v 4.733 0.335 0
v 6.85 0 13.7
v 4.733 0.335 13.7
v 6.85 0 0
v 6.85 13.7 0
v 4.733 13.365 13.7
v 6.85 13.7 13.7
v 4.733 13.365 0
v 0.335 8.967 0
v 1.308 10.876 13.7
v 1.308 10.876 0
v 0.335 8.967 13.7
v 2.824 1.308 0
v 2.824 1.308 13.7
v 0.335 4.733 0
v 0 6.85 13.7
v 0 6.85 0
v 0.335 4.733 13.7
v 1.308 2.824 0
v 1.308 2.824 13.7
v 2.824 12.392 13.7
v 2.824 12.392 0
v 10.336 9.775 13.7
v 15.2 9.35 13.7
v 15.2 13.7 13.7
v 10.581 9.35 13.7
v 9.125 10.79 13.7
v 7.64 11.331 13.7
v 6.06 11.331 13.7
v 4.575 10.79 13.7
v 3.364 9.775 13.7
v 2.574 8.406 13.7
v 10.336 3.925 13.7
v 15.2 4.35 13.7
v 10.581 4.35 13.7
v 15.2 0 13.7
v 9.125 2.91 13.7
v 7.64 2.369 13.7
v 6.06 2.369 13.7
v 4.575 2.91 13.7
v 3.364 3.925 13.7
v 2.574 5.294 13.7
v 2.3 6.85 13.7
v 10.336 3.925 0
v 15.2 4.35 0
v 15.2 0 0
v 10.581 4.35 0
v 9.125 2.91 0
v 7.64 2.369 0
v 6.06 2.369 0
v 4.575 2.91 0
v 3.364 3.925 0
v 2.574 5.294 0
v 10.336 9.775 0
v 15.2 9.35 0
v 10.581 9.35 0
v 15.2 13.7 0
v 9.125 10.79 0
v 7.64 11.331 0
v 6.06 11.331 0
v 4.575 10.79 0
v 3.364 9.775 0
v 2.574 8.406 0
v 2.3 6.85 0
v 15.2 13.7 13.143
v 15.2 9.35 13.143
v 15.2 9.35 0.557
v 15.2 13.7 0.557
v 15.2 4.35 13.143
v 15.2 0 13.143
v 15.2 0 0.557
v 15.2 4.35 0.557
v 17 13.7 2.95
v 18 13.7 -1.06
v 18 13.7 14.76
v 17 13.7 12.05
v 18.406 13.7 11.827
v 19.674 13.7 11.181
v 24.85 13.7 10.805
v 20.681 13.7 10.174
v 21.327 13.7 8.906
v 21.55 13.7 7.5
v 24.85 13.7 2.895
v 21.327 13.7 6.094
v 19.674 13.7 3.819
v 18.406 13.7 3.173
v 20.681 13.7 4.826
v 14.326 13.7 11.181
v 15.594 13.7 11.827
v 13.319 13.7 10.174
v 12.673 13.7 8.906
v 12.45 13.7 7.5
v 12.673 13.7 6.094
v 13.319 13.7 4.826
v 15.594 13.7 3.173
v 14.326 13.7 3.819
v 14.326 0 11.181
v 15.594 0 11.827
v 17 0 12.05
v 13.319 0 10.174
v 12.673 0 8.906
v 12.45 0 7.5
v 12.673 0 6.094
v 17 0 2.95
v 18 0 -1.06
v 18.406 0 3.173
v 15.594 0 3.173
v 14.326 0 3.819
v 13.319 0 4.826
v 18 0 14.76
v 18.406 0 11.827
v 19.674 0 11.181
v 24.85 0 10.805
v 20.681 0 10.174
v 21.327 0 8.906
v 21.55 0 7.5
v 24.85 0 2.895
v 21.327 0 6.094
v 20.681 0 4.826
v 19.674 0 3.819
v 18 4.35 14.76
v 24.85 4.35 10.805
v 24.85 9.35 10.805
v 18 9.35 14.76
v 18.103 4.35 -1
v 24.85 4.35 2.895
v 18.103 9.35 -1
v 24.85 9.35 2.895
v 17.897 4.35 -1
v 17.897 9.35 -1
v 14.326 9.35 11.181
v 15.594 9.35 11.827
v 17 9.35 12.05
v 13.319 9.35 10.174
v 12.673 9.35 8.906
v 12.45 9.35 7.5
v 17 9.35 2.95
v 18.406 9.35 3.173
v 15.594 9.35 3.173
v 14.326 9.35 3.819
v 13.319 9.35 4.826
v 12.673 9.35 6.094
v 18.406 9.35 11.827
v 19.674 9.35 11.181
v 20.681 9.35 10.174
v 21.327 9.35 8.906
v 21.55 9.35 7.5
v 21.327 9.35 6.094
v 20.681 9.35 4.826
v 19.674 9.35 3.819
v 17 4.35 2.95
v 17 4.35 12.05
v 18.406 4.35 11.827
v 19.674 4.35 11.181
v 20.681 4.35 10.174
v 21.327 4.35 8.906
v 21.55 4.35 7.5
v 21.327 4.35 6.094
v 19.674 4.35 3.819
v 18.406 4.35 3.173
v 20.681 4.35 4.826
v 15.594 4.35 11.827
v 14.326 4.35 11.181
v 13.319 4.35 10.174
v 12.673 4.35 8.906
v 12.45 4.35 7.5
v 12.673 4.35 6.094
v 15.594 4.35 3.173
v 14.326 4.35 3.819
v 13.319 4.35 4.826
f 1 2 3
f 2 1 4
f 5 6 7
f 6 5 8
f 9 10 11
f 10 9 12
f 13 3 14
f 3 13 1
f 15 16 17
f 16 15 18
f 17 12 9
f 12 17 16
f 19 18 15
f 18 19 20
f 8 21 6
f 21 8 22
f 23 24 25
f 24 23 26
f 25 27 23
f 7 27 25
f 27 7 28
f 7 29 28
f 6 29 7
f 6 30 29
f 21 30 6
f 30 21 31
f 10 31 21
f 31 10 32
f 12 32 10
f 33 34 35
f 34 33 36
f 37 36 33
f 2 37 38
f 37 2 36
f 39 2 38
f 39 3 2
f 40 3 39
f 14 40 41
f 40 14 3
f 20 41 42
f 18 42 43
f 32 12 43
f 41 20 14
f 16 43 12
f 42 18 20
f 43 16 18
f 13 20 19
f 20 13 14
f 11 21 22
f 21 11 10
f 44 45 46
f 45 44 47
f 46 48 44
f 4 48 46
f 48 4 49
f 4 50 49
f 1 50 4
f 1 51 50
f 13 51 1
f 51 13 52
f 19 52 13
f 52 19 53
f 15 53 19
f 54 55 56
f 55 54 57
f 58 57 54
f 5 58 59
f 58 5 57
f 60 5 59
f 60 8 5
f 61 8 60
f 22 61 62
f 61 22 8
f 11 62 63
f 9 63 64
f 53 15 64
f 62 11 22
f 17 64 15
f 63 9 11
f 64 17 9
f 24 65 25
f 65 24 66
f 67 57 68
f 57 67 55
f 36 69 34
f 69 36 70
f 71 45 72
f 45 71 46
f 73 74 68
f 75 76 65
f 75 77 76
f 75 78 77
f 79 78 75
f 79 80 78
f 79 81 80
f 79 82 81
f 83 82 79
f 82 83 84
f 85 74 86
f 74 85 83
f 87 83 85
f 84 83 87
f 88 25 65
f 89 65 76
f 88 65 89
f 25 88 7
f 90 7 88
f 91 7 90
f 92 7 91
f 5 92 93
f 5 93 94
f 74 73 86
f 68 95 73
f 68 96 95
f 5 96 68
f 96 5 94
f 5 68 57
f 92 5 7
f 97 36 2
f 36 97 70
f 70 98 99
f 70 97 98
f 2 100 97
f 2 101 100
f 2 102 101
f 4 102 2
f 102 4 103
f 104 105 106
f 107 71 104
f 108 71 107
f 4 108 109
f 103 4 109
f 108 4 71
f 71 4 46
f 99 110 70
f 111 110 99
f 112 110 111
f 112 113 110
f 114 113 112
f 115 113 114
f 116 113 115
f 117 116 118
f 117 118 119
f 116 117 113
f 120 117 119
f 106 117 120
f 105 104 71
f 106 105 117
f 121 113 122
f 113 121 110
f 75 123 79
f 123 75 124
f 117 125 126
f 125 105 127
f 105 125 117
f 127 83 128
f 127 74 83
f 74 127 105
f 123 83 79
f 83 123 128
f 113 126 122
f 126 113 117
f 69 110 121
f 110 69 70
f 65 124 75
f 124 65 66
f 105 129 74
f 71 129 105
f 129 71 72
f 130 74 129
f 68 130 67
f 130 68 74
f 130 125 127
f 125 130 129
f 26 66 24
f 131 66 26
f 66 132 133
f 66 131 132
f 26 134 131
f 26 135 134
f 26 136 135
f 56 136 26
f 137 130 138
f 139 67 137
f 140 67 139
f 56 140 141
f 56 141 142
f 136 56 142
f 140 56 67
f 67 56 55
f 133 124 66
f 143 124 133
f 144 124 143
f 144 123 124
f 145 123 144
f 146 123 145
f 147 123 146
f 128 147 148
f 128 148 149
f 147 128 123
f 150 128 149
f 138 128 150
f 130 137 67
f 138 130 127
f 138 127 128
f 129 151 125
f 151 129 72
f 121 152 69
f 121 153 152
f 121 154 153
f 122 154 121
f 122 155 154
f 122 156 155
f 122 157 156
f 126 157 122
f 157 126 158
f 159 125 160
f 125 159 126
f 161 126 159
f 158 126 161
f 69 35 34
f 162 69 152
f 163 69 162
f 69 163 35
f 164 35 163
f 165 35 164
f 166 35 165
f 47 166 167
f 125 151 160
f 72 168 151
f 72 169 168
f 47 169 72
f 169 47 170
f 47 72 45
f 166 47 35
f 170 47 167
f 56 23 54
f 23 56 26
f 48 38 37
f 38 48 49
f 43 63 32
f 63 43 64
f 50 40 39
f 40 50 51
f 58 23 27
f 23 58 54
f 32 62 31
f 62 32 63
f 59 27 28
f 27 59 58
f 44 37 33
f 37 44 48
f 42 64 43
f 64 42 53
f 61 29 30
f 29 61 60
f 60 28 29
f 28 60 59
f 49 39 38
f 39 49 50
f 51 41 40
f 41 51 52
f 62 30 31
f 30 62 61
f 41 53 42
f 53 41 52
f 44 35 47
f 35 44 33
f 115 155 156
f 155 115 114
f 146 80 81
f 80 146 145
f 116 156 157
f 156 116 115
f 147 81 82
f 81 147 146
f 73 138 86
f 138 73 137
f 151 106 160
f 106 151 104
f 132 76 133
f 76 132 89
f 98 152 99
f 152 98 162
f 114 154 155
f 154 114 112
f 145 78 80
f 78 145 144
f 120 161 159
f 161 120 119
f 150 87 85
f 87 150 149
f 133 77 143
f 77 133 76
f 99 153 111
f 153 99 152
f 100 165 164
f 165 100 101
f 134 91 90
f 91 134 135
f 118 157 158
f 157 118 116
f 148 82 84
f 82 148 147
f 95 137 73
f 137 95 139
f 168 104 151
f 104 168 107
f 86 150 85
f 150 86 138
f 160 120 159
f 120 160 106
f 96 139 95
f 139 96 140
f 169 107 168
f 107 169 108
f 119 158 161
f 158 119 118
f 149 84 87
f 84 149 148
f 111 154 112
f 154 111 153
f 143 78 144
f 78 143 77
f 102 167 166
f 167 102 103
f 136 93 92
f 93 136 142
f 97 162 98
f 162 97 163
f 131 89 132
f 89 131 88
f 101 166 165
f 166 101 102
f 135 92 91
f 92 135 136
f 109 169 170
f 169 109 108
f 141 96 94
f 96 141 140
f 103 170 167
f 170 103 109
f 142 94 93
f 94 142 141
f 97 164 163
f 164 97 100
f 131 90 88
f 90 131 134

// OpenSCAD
// file: functions.scad
// PRUSA Mendel  
// Functions used in many files
// GNU GPL v3
// Josef Průša
// josefprusa@me.com
// prusadjs.cz
// http://www.reprap.org/wiki/Prusa_Mendel
// http://github.com/prusajr/PrusaMendel


module nut(d,h,horizontal=true){
cornerdiameter =  (d / 2) / cos (180 / 6);
cylinder(h = h, r = cornerdiameter, $fn = 6);
if(horizontal){
for(i = [1:6]){
	rotate([0,0,60*i]) translate([-cornerdiameter-0.2,0,0]) rotate([0,0,-45]) cube(size = [2,2,h]);
}}
}

// Based on nophead research
module polyhole(d,h) {
    n = max(round(2 * d),3);
    rotate([0,0,180])
        cylinder(h = h, r = (d / 2) / cos (180 / n), $fn = n);
}




module roundcorner(diameter){
	difference(){
		cube(size = [diameter,diameter,99], center = false);
		translate(v = [diameter, diameter, 0]) cylinder(h = 100, r=diameter, center=true);
	}
}
// file: metric.scad
// PRUSA Mendel  
// Default metric sizes
// GNU GPL v3
// Josef Průša
// josefprusa@me.com
// prusadjs.cz
// http://www.reprap.org/wiki/Prusa_Mendel
// http://github.com/prusajr/PrusaMendel

// DONT CHANGE THIS FILE! ALTER VALUES IN CONFIGURATION.SCAD INSTEAD

// RODS

threaded_rod_diameter = 8.7;
threaded_rod_diameter_horizontal = 8.7;
smooth_bar_diameter = 8;
smooth_bar_diameter_horizontal = 8.5;

// Nuts and bolts

m8_diameter = 9;
m8_nut_diameter = 14.1;

m4_diameter = 4.5;
m4_nut_diameter = 9;

m3_diameter = 3.6;
m3_nut_diameter = 5.3;
m3_nut_diameter_horizontal = 6.1;

// Bushing holder

bushing_core_diameter = smooth_bar_diameter;
bushing_material_thickness = 1;

// Motors

motor_shaft = 5.5;
// file: configuration.scad
// PRUSA Mendel  
// Configuration file
// GNU GPL v3
// Josef Průša
// josefprusa@me.com
// prusadjs.cz
// http://www.reprap.org/wiki/Prusa_Mendel
// http://github.com/prusajr/PrusaMendel

// PLEASE SELECT ONE OF THE CONFIGURATIONS BELOW
// BY UN-COMMENTING IT

// Uncomment for metric settings
// METRIC METRIC METRIC METRIC METRIC METRIC METRIC METRIC 

include <metric.scad>;

// CUSTOM CUSTOM CUSTOM CUSTOM CUSTOM CUSTOM CUSTOM CUSTOM CUSTOM

thin_wall = 3;


// Linear bearing version
linear = true;
// set false for LM-8UU, true for LM-E-8UU (ignore if linear is set to false)
lme8uu = false;



// CHANGE ONLY THE STUFF YOU KNOW
// IT WILL REPLACE DEFAULT SETTING

// RODS
threaded_rod_diameter = 9.1;
threaded_rod_diameter_horizontal = 0;
// smooth_bar_diameter = 0;
// smooth_bar_diameter_horizontal = 0;

// Nuts and bolts

m8_diameter = 8.125;
m8_nut_diameter = 13;

m4_diameter = 4.5;
m4_nut_diameter = 8.1;

m3_diameter = 3.45;
m3_nut_diameter = 6.34;

motor_shaft = 5.65;

// Bushing holder

// bushing_core_diameter = smooth_bar_diameter;
// bushing_material_thickness = 0;


///counted stuff
m3_nut_diameter_bigger = ((m3_nut_diameter  / 2) / cos (180 / 6))*2;
//m3_nut_diameter = m3_nut_diameter_bigger;
// functions 
include <functions.scad>
// main file
// PRUSA Mendel  
// Bar clamp
// Used for joining 8mm rods
// GNU GPL v3
// Josef Průša
// josefprusa@me.com
// prusadjs.cz
// http://www.reprap.org/wiki/Prusa_Mendel
// http://github.com/prusajr/PrusaMendel

include <configuration.scad>

/**
 * @id bar-clamp
 * @name Bar clamp
 * @category Printed
 * @using 2 m8nut
 * @using 2 m8washer
 */ 

module barclamp(){
outer_diameter = (threaded_rod_diameter)/2+2.3;
//outer_diameter = (threaded_rod_diameter)/2+2.7;

difference(){
	union(){
		
		translate([outer_diameter, outer_diameter, 0])cylinder(h =outer_diameter*2, r = outer_diameter, $fn = 20);
		translate([outer_diameter, 0, 0])cube([outer_diameter+1.5,outer_diameter*2,outer_diameter*2]);
		translate([18, 2*outer_diameter, outer_diameter])rotate([90, 90, 0]) rotate([00, , 0]) nut(outer_diameter*2,outer_diameter*2,false);
	}


	translate([18, outer_diameter, 9])cube([18,05,20], center=true);
	translate([outer_diameter, outer_diameter, -1]) #cylinder(h =20, r = threaded_rod_diameter/2, $fn = 18);
	translate([17, 17, 7.5]) rotate([90, 0, 0]) #cylinder(h =20, r = threaded_rod_diameter/2, $fn = 20);
}
}
barclamp();
